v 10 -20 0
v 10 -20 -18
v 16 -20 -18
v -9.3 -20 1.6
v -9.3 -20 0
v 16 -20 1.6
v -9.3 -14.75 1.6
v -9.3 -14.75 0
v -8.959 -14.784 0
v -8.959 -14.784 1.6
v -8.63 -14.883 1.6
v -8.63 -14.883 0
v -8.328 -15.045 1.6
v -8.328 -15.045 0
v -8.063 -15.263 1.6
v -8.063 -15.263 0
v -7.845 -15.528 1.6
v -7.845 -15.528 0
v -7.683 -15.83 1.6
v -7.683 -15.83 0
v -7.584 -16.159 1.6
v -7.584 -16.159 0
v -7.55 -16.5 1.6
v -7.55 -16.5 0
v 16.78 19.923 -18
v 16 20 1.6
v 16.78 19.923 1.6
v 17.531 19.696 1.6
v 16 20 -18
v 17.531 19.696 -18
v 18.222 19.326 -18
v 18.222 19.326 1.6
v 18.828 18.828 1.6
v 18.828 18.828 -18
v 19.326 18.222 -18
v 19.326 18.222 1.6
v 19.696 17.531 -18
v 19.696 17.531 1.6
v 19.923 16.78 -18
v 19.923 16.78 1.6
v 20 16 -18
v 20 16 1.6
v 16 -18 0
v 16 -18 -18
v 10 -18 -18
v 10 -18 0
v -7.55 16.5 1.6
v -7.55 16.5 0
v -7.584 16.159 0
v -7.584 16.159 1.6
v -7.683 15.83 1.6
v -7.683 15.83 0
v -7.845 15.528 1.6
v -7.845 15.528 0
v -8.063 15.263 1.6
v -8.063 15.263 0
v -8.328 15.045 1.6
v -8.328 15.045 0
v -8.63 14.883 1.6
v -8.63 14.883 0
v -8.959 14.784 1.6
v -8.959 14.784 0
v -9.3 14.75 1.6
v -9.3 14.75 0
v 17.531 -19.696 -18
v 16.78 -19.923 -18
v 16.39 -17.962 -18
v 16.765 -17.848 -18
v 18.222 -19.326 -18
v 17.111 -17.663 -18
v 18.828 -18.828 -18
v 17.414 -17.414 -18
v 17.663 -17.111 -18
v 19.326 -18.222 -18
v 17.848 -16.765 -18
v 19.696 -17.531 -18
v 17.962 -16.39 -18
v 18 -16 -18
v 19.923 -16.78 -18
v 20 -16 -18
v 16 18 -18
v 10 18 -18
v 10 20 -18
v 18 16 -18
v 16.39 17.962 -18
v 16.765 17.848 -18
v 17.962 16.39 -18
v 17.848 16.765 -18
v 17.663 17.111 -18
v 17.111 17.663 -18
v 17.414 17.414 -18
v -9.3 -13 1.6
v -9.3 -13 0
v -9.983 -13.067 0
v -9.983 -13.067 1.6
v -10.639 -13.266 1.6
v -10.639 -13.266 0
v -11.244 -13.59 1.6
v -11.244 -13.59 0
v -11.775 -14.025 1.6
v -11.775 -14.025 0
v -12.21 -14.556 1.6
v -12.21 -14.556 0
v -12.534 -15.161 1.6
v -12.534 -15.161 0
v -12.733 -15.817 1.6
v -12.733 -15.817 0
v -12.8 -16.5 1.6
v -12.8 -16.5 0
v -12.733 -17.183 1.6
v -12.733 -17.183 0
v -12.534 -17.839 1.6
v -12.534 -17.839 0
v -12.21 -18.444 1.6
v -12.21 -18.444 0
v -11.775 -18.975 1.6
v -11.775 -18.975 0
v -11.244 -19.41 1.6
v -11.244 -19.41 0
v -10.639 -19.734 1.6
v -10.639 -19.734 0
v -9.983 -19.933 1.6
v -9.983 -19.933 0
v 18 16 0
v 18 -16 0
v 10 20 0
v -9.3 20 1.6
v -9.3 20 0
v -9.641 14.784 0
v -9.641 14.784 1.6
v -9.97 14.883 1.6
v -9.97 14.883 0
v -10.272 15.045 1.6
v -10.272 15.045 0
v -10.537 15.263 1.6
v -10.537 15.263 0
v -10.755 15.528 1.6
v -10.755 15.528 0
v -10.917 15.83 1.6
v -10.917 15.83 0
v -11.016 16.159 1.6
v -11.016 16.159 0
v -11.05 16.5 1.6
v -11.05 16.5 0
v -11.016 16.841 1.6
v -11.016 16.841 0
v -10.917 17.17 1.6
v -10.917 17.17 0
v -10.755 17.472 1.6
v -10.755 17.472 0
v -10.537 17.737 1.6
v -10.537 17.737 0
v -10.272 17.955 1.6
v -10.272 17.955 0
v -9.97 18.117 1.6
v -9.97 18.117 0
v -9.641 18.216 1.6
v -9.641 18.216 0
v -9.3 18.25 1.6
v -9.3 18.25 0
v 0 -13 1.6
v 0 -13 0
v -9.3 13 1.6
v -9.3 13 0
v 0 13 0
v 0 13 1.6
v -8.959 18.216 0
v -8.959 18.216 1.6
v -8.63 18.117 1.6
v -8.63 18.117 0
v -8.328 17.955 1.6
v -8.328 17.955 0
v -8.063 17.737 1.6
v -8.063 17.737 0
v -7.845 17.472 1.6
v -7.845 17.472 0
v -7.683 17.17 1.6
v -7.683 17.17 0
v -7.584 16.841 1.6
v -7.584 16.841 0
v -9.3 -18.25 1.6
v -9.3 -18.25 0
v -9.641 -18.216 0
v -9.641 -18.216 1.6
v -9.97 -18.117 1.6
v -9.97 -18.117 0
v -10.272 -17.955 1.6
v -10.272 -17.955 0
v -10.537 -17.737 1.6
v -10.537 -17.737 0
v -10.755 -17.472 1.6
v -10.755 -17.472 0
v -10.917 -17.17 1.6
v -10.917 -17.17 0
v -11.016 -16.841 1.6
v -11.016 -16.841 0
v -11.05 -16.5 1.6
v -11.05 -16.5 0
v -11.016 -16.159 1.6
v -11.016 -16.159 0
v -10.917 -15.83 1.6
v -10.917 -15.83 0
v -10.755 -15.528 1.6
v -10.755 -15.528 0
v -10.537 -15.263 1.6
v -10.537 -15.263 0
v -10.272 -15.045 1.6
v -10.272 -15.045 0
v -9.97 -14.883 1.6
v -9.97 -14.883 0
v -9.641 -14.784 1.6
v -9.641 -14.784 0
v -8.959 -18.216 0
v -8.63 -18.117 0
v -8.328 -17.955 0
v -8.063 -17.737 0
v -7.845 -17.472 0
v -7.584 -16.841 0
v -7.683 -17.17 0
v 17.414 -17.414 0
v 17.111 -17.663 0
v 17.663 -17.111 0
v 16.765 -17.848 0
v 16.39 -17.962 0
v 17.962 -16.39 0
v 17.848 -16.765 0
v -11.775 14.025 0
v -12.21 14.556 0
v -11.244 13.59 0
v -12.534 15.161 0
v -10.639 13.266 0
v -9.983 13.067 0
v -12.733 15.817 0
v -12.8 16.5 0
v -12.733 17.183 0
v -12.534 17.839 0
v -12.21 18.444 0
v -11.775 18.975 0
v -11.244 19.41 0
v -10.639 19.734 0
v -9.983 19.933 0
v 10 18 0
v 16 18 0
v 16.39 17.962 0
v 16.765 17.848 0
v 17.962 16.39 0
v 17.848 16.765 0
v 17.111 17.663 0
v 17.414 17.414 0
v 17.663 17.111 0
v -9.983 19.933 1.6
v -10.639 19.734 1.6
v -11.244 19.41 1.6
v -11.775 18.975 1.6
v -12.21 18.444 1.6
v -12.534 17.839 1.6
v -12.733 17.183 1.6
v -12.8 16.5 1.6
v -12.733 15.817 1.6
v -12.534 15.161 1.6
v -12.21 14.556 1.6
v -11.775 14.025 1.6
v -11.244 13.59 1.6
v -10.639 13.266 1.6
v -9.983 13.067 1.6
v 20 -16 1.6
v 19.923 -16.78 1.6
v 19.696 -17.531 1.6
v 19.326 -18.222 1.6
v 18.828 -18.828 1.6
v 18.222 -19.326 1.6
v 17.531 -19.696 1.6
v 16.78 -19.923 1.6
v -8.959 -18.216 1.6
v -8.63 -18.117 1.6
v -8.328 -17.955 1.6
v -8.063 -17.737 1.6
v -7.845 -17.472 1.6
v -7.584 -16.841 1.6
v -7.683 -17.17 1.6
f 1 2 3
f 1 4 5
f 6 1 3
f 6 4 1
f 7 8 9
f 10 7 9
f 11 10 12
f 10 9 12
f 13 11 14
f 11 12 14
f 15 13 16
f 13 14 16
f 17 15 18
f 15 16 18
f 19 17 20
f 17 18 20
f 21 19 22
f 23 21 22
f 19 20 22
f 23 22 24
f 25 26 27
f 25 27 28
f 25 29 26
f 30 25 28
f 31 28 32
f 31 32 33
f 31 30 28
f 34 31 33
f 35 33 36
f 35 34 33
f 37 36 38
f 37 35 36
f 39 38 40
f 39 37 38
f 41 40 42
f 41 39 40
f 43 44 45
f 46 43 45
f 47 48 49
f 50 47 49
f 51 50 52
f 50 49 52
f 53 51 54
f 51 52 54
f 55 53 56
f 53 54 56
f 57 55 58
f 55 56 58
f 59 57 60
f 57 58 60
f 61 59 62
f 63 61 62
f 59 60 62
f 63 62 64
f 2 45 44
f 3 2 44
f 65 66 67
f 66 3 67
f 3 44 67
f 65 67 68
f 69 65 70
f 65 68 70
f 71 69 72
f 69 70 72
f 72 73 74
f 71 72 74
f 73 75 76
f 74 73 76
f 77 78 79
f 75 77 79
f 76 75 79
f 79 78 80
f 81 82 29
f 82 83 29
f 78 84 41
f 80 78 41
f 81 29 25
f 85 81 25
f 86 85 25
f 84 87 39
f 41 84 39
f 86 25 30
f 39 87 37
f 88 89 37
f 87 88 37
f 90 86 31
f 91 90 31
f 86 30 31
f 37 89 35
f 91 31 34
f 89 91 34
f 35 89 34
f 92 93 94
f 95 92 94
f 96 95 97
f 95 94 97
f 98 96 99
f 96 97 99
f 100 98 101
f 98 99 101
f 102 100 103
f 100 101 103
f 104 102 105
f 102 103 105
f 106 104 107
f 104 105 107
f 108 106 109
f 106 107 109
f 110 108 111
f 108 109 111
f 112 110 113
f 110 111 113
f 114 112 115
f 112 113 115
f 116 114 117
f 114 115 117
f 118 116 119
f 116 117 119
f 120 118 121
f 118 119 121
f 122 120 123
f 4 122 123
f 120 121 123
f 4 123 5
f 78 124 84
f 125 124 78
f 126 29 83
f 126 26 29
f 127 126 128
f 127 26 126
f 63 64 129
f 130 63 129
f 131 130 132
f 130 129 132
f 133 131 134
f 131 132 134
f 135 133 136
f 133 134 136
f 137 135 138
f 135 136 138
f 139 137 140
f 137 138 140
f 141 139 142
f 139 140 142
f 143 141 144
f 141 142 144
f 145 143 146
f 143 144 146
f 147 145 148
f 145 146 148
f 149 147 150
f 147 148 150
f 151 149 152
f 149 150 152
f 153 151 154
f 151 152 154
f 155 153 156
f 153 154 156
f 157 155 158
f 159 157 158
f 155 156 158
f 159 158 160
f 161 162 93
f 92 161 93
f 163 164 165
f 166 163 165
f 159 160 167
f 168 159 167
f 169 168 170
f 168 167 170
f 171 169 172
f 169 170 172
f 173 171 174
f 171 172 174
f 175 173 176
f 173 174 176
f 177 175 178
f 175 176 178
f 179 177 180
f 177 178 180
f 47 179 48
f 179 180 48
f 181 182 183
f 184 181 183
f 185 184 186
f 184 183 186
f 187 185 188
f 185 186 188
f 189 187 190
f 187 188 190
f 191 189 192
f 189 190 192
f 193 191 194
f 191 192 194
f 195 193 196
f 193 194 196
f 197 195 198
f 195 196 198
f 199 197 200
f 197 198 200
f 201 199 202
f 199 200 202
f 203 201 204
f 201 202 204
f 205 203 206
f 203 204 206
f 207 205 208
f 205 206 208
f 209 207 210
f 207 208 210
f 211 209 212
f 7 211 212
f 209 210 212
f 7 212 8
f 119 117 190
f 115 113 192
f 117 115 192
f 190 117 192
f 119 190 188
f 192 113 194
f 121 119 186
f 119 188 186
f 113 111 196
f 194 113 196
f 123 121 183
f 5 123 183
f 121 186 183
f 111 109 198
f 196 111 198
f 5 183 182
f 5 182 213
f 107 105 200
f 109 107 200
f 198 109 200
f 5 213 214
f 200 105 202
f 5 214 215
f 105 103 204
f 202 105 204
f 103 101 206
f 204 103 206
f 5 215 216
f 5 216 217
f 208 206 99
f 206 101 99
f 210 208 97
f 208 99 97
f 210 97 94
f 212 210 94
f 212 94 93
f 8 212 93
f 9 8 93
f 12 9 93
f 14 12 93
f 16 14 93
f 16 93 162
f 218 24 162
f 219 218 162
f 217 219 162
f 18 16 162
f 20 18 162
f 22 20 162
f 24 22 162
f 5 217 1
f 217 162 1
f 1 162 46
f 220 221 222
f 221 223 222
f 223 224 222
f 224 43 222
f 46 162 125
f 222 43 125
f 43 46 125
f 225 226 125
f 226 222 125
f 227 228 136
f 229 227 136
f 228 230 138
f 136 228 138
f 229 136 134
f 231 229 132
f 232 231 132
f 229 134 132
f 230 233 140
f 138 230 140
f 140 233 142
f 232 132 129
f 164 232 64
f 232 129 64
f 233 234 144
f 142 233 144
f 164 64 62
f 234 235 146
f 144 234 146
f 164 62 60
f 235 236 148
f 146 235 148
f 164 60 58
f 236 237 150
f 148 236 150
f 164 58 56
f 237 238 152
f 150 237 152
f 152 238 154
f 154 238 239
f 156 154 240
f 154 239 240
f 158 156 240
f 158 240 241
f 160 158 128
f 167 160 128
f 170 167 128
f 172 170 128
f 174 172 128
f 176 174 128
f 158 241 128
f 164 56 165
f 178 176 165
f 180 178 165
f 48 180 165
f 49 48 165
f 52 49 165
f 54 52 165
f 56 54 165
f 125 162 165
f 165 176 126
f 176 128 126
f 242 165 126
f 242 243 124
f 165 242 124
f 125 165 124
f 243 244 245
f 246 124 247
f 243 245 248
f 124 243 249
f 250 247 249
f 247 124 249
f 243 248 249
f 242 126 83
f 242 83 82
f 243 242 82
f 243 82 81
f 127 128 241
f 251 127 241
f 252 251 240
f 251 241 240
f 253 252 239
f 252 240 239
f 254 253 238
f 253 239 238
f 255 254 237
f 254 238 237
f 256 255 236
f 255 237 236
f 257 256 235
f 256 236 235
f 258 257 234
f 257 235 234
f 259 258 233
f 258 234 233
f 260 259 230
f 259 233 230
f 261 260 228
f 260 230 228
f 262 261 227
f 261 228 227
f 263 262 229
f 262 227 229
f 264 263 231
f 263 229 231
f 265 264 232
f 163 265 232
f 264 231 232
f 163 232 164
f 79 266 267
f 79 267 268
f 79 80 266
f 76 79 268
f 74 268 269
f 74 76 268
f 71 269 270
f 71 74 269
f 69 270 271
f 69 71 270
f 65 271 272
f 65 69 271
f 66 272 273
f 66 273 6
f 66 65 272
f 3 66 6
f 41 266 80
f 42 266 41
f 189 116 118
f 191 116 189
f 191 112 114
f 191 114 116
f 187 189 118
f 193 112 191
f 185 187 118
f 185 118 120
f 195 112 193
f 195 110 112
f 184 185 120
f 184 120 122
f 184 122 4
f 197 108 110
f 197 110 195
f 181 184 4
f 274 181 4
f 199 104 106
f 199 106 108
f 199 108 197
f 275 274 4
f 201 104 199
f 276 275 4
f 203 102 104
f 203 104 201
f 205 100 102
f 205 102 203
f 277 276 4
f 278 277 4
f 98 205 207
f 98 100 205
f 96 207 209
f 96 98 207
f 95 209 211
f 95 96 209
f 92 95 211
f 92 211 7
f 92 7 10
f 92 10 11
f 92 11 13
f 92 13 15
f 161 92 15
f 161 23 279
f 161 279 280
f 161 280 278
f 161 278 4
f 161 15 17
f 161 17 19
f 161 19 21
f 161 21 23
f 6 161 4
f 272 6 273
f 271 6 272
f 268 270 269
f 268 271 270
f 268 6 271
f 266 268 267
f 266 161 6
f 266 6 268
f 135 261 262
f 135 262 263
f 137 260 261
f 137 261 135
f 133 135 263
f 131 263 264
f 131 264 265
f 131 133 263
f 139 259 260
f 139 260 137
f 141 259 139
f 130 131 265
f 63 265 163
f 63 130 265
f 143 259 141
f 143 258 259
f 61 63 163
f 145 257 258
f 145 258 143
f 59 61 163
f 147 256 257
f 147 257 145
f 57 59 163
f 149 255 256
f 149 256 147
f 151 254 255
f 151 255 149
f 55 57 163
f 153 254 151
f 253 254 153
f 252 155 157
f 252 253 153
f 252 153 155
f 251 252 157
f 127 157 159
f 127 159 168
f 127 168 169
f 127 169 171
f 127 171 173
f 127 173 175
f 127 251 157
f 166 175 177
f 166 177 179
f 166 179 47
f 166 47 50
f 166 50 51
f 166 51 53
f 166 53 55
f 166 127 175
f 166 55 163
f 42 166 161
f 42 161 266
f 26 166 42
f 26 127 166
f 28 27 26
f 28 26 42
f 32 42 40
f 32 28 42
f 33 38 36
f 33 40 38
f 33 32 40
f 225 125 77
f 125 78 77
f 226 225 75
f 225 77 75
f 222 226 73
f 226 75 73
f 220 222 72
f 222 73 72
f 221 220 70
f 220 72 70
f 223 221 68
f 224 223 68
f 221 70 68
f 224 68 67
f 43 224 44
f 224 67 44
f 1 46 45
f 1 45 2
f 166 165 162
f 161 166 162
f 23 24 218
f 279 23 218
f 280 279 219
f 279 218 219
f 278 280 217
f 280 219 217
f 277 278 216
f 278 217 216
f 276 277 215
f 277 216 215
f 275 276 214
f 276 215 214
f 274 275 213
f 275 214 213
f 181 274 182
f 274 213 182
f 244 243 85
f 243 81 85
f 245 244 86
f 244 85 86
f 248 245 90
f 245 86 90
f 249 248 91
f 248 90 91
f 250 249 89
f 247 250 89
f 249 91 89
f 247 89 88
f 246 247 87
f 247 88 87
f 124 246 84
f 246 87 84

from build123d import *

# Parameters (mm, degrees)
F1_DEPTH = 1.6
F2_DEPTH = 18
F3_R     = 4
F4_R     = 2


# Not quite as in the source:
# - a feature names something its author has since deleted; it is built from what else it names


with BuildPart() as f1:
    # F0 (on Top) → F1 (new body)
    with BuildSketch(Plane.XY):
        with BuildLine():
            Line((-9.3, 18.25), (-9.3, 20))
            ThreePointArc((-9.3, 20), (-12.8, 16.5), (-9.3, 13))
            Line((-9.3, 13), (-9.3, 14.75))
            ThreePointArc((-9.3, 14.75), (-11.05, 16.5), (-9.3, 18.25))
        make_face()
        with BuildLine():
            ThreePointArc((-5.8, 16.5), (-6.8251262658, 18.9748737342), (-9.3, 20))
            Line((-9.3, 20), (-9.3, 18.25))
            ThreePointArc((-9.3, 18.25), (-8.0625631329, 17.7374368671), (-7.55, 16.5))
            ThreePointArc((-7.55, 16.5), (-8.0625631329, 15.2625631329), (-9.3, 14.75))
            Line((-9.3, 14.75), (-9.3, 13))
            ThreePointArc((-9.3, 13), (-6.8251262658, 14.0251262658), (-5.8, 16.5))
        make_face()
        with BuildLine():
            Line((0, 13), (0, 20))
            Line((0, 20), (-9.3, 20))
            ThreePointArc((-9.3, 20), (-6.8251262658, 18.9748737342), (-5.8, 16.5))
            ThreePointArc((-5.8, 16.5), (-6.8251262658, 14.0251262658), (-9.3, 13))
            Line((-9.3, 13), (0, 13))
        make_face()
        with BuildLine():
            Line((-9.3, -14.75), (-9.3, -13))
            ThreePointArc((-9.3, -13), (-12.8, -16.5), (-9.3, -20))
            Line((-9.3, -20), (-9.3, -18.25))
            ThreePointArc((-9.3, -18.25), (-11.05, -16.5), (-9.3, -14.75))
        make_face()
        with BuildLine():
            ThreePointArc((-5.8, -16.5), (-6.8251262658, -14.0251262658), (-9.3, -13))
            Line((-9.3, -13), (-9.3, -14.75))
            ThreePointArc((-9.3, -14.75), (-8.0625631329, -15.2625631329), (-7.55, -16.5))
            ThreePointArc((-7.55, -16.5), (-8.0625631329, -17.7374368671), (-9.3, -18.25))
            Line((-9.3, -18.25), (-9.3, -20))
            ThreePointArc((-9.3, -20), (-6.8251262658, -18.9748737342), (-5.8, -16.5))
        make_face()
        with BuildLine():
            Line((0, -20), (0, -13))
            Line((0, -13), (-9.3, -13))
            ThreePointArc((-9.3, -13), (-6.8251262658, -14.0251262658), (-5.8, -16.5))
            ThreePointArc((-5.8, -16.5), (-6.8251262658, -18.9748737342), (-9.3, -20))
            Line((-9.3, -20), (0, -20))
        make_face()
        Polygon((2, 18), (0, 20), (0, 13), (0, -13), (0, -20), (2, -18), align=None)
        Polygon((20, 20), (10, 20), (10, 18), (18, 18), (18, -18), (10, -18), (10, -20), (20, -20), align=None)
        Polygon((10, 18), (2, 18), (2, -18), (10, -18), (18, -18), (18, 18), align=None)
        Polygon((10, 20), (0, 20), (2, 18), (10, 18), align=None)
        Polygon((10, -18), (2, -18), (0, -20), (10, -20), align=None)
    extrude(amount=F1_DEPTH)

    # F0 (on Top) → F2 (join)
    with BuildSketch(Plane.XY):
        Polygon((20, 20), (10, 20), (10, 18), (18, 18), (18, -18), (10, -18), (10, -20), (20, -20), align=None)
    extrude(amount=-F2_DEPTH)

    # F3
    f3_edges = [f1.edges().sort_by_distance(p)[0] for p in [
        (20, -20, -8.2),
        (20, 20, -8.2),
    ]]
    fillet(f3_edges, radius=F3_R)

    # F4
    f4_edges = [f1.edges().sort_by_distance(p)[0] for p in [
        (18, -18, -9),
        (18, 18, -9),
    ]]
    fillet(f4_edges, radius=F4_R)


solid = f1.part
